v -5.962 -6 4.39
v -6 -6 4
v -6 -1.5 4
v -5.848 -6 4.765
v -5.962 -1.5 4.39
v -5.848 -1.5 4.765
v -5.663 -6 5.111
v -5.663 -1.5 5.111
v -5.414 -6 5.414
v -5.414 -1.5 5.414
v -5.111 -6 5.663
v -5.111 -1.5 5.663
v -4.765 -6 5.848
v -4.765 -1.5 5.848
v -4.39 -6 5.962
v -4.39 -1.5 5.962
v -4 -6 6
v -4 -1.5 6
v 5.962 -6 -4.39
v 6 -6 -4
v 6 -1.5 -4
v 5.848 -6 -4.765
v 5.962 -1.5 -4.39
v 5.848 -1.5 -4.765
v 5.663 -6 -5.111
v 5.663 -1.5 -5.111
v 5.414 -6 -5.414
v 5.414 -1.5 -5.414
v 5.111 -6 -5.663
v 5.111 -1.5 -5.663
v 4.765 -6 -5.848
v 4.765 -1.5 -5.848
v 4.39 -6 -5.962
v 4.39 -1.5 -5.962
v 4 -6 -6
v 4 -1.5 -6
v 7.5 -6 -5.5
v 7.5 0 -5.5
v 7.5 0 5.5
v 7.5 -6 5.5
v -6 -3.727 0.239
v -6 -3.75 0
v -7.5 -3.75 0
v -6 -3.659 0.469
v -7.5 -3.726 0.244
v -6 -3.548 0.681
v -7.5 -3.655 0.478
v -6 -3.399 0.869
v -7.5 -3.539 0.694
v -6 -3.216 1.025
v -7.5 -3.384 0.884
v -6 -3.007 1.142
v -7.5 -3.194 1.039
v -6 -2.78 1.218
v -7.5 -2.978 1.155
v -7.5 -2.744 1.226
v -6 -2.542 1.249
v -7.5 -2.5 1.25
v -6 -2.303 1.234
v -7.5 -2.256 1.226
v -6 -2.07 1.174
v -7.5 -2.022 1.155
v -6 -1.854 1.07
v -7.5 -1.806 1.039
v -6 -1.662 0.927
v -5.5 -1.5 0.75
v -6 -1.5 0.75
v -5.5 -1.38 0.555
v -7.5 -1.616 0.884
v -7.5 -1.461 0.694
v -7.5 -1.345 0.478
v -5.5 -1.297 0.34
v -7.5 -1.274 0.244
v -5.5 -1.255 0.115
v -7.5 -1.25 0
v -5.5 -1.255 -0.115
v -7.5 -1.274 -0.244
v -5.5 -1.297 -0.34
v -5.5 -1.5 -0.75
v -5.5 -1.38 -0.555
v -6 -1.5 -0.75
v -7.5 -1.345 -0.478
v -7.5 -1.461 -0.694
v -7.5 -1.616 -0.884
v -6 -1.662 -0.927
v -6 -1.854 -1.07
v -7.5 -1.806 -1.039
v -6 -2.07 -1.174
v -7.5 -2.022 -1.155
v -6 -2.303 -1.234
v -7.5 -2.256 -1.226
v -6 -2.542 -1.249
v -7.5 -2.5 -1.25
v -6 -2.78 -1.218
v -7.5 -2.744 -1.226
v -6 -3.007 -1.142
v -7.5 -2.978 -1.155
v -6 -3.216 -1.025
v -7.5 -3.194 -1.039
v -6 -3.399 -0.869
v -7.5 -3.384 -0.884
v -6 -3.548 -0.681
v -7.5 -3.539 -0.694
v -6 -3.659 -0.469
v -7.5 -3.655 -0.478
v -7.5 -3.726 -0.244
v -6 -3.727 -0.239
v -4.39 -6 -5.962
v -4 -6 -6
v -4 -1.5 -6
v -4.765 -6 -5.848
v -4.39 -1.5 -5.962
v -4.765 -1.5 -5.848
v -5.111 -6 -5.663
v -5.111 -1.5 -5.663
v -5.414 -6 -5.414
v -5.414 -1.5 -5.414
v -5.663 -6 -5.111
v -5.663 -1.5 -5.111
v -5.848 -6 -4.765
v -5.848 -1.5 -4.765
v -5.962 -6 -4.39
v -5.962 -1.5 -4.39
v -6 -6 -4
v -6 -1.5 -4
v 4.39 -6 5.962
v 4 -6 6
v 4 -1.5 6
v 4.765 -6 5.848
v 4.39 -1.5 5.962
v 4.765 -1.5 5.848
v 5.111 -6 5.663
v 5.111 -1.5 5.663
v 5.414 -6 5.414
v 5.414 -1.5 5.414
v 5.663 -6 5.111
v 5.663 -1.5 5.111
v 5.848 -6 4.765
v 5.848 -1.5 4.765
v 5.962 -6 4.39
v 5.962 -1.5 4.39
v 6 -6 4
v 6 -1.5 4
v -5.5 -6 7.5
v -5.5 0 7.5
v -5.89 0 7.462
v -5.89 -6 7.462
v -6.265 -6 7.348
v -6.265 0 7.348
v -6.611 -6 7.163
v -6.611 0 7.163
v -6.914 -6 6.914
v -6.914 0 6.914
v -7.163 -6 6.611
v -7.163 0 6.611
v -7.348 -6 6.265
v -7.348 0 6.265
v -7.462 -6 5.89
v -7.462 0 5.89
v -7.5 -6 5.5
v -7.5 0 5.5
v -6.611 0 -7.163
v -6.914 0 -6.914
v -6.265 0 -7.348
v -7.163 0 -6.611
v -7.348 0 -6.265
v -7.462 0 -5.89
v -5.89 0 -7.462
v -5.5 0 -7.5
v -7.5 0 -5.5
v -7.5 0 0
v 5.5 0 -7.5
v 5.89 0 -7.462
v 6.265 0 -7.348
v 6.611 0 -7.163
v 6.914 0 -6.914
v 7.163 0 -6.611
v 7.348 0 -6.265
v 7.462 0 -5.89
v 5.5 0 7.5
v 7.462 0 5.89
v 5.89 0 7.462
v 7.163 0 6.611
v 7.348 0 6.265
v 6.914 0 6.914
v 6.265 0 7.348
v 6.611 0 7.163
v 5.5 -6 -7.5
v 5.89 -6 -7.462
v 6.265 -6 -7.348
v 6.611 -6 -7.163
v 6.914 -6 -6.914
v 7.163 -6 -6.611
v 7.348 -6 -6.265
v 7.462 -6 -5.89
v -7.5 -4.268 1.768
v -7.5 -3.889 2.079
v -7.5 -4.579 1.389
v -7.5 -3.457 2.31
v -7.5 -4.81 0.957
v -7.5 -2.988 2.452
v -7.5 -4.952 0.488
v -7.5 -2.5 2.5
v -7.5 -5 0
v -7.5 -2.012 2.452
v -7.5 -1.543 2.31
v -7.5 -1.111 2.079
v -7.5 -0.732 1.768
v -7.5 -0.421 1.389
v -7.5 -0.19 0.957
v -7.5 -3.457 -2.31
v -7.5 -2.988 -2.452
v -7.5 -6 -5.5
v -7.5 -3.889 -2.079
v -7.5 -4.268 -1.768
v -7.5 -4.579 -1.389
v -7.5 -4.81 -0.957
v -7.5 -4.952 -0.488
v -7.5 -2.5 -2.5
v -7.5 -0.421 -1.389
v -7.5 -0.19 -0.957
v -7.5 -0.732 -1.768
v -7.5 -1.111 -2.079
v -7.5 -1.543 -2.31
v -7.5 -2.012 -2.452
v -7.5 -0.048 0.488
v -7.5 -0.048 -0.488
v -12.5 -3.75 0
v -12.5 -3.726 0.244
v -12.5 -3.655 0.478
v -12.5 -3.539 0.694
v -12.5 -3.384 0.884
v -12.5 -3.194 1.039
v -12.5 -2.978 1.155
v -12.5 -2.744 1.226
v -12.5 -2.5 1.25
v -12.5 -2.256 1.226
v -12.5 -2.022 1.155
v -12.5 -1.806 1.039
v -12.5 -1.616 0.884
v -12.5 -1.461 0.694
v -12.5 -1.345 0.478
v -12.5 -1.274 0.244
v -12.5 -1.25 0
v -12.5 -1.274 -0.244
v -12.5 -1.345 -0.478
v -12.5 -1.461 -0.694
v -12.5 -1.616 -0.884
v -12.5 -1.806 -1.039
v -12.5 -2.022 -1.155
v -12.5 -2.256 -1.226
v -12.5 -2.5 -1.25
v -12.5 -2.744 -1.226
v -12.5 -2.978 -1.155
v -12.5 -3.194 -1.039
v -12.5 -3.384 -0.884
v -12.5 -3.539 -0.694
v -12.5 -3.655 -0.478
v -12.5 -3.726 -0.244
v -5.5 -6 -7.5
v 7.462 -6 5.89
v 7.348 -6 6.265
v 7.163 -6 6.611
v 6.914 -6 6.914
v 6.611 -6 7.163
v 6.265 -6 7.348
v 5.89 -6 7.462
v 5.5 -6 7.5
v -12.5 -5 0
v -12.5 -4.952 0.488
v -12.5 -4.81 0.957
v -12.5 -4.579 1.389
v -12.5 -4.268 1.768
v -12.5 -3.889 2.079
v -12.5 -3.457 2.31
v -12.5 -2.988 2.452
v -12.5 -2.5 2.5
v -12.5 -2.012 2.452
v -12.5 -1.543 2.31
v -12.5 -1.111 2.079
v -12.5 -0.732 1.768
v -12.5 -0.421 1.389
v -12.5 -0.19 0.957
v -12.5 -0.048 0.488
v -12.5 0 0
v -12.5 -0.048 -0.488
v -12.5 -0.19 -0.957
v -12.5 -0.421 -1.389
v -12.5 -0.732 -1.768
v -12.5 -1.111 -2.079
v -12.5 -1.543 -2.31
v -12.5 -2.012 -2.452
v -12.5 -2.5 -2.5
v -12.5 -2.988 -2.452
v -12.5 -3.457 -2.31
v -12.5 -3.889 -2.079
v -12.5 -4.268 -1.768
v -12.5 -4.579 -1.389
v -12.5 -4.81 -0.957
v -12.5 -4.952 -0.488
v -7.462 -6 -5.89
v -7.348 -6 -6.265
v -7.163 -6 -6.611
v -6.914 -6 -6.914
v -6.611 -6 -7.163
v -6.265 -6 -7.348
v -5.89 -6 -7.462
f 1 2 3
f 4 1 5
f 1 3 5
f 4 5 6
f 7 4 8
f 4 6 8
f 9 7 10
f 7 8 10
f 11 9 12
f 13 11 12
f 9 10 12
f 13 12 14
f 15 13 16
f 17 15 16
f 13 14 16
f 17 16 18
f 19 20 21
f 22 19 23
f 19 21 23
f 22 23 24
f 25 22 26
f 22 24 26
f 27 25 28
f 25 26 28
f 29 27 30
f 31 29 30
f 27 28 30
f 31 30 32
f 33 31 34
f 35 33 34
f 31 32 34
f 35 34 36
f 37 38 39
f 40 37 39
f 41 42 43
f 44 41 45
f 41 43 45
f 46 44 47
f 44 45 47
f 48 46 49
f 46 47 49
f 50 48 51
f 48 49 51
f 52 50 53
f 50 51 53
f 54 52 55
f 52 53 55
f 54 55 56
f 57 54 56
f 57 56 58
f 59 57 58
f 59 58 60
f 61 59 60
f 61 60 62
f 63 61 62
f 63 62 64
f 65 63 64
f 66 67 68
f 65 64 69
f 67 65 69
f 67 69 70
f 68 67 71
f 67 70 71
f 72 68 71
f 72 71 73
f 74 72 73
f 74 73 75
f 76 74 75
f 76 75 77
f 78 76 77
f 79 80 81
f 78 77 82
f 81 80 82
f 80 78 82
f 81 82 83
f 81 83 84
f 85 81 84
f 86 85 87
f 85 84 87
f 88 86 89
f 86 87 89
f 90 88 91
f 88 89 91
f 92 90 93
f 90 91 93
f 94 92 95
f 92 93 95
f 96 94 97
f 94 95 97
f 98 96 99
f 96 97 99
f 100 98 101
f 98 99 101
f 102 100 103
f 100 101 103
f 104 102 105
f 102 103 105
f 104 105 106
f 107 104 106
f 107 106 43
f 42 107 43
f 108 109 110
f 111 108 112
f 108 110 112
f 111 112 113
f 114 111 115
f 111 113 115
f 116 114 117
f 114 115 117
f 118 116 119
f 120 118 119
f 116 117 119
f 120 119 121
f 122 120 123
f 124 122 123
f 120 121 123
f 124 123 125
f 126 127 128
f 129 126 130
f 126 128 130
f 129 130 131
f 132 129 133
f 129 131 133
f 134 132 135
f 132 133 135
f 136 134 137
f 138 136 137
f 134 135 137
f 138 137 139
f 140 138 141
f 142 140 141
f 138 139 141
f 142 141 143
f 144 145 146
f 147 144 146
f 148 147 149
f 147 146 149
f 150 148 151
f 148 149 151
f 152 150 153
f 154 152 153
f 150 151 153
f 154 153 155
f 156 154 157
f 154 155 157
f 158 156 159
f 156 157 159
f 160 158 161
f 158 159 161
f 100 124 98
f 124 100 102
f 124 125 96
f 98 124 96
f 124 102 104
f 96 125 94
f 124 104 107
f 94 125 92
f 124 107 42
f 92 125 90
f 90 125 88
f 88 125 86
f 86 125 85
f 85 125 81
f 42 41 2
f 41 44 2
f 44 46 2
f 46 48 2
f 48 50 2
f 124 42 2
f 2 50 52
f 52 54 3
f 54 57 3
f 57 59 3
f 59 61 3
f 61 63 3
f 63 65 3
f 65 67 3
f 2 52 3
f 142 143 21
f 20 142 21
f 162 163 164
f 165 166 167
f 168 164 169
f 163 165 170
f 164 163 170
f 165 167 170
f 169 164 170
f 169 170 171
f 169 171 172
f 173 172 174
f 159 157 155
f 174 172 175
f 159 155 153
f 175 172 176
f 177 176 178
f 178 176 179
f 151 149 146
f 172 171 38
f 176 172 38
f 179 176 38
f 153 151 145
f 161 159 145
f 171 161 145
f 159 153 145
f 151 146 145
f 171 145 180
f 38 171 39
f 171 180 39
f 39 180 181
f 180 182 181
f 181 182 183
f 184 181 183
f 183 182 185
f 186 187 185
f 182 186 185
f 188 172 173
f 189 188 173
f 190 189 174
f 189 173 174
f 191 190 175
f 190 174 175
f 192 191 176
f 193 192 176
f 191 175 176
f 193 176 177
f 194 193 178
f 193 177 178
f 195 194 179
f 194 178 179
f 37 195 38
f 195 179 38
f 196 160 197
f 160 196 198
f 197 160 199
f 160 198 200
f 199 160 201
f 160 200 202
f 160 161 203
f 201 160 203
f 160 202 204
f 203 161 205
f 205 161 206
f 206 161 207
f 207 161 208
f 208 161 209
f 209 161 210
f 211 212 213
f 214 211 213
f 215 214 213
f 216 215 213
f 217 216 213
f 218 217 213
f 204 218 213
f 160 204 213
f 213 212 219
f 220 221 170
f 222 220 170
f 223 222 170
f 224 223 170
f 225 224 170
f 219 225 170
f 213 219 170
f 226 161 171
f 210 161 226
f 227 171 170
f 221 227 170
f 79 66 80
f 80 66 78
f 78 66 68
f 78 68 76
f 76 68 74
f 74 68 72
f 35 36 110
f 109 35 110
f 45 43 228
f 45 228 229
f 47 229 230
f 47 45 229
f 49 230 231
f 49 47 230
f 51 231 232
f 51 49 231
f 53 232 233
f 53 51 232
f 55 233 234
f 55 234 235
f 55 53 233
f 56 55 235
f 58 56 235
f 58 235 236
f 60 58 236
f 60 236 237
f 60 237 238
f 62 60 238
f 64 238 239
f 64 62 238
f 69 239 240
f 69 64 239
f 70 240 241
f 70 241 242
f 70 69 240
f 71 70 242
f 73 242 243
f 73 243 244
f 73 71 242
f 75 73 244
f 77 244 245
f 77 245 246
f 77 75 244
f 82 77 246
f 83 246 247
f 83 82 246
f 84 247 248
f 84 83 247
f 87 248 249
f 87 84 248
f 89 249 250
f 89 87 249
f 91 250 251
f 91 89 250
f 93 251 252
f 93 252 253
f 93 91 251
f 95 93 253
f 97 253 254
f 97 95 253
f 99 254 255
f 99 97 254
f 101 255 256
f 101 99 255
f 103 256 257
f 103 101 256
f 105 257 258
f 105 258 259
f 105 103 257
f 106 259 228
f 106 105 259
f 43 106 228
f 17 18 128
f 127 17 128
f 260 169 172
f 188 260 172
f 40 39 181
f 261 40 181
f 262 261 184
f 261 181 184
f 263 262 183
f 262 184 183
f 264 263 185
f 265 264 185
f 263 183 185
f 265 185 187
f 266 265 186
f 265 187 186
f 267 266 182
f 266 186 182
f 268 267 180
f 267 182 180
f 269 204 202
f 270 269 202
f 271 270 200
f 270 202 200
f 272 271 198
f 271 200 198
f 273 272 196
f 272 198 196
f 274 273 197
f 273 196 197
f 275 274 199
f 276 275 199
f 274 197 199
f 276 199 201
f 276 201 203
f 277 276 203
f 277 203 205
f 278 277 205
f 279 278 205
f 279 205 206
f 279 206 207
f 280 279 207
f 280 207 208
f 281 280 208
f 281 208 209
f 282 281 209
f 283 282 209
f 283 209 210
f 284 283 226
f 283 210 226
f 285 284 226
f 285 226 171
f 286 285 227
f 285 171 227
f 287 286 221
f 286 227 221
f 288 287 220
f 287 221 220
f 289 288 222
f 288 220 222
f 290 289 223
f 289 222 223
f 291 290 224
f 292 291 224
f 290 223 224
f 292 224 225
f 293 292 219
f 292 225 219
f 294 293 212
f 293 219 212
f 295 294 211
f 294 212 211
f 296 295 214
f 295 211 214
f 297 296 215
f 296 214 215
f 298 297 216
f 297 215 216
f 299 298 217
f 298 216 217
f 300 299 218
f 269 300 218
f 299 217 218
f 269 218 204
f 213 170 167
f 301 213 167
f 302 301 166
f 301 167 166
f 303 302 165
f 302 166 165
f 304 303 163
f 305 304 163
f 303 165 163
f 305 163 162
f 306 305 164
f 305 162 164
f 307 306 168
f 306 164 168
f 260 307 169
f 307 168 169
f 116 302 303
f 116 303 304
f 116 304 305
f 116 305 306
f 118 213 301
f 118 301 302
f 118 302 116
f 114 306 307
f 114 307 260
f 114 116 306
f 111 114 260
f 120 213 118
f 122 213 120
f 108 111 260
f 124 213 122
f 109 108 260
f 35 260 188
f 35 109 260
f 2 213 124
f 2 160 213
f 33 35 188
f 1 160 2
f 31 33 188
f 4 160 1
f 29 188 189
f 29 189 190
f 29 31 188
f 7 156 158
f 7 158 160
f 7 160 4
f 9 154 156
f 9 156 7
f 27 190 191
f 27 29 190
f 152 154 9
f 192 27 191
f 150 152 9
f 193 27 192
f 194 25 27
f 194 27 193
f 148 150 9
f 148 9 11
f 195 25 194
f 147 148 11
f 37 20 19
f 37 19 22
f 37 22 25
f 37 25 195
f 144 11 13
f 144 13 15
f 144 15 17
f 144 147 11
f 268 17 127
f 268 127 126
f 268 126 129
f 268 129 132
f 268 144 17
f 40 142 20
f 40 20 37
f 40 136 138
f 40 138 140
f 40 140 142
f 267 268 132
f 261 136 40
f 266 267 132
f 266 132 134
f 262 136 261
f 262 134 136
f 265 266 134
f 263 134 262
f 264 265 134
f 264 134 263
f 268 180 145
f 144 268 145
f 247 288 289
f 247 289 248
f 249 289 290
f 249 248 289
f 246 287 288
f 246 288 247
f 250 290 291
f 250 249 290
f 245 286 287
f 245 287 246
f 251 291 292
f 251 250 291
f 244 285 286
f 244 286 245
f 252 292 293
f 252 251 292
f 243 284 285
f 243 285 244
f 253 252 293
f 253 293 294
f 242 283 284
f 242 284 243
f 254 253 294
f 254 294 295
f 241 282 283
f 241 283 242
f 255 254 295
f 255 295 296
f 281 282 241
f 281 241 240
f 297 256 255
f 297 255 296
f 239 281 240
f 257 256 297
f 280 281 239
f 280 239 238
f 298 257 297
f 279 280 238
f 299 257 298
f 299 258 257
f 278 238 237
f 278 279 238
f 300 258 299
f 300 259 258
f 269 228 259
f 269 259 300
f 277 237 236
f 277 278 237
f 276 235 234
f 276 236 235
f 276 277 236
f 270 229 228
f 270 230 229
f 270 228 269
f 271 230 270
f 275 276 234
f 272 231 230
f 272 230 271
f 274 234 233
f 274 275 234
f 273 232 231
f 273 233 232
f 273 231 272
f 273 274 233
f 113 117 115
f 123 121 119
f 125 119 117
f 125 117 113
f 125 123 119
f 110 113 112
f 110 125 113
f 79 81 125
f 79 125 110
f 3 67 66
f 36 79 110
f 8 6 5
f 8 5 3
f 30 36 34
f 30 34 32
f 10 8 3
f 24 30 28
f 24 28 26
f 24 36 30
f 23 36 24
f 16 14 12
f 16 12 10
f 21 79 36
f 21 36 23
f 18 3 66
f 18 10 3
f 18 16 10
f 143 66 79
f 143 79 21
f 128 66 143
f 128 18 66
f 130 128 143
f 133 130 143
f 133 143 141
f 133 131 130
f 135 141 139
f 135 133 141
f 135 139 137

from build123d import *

# Parameters (mm, degrees)
F1_DEPTH = 1.5
F2_DEPTH = 6
F3_R     = 1.25
F4_DEPTH = 2
F5_DEPTH = 5


with BuildPart() as f1:
    # F0 (on Front) → F1 (new body)
    with BuildSketch(Plane.XZ):
        with BuildLine():
            Line((-4, -6), (4, -6))
            ThreePointArc((4, -6), (5.414214, -5.414214), (6, -4))
            Line((6, -4), (6, 4))
            ThreePointArc((6, 4), (5.414214, 5.414214), (4, 6))
            Line((4, 6), (-4, 6))
            ThreePointArc((-4, 6), (-5.414214, 5.414214), (-6, 4))
            Line((-6, 4), (-6, -4))
            ThreePointArc((-6, -4), (-5.414214, -5.414214), (-4, -6))
        make_face()
    extrude(amount=F1_DEPTH)

    # F0 (on Front) → F2 (join)
    with BuildSketch(Plane.XZ):
        with BuildLine():
            Line((-5.5, -7.5), (5.5, -7.5))
            ThreePointArc((5.5, -7.5), (6.914214, -6.914214), (7.5, -5.5))
            Line((7.5, -5.5), (7.5, 5.5))
            ThreePointArc((7.5, 5.5), (6.914214, 6.914214), (5.5, 7.5))
            Line((5.5, 7.5), (-5.5, 7.5))
            ThreePointArc((-5.5, 7.5), (-6.914214, 6.914214), (-7.5, 5.5))
            Line((-7.5, 5.5), (-7.5, -5.5))
            ThreePointArc((-7.5, -5.5), (-6.914214, -6.914214), (-5.5, -7.5))
        make_face()
        with BuildLine():
            ThreePointArc((6, -4), (5.414214, -5.414214), (4, -6))
            Line((4, -6), (-4, -6))
            ThreePointArc((-4, -6), (-5.414214, -5.414214), (-6, -4))
            Line((-6, -4), (-6, 4))
            ThreePointArc((-6, 4), (-5.414214, 5.414214), (-4, 6))
            Line((-4, 6), (4, 6))
            ThreePointArc((4, 6), (5.414214, 5.414214), (6, 4))
            Line((6, 4), (6, -4))
        make_face(mode=Mode.SUBTRACT)
    extrude(amount=F2_DEPTH)

    # F3 (on face) → F4 (cut)
    with BuildSketch(Plane(origin=(-7.5, 0, 0), x_dir=(0, -1, 0), z_dir=(-1, 0, 0))):
        with Locations((2.5, 0)):
            Circle(F3_R)
    extrude(amount=-F4_DEPTH, mode=Mode.SUBTRACT)

    # F3 (on face) → F5 (join)
    with BuildSketch(Plane(origin=(-7.5, 0, 0), x_dir=(0, -1, 0), z_dir=(-1, 0, 0))):
        with BuildLine():
            ThreePointArc((0, 0), (2.5, -2.5), (5, 0))
            ThreePointArc((5, 0), (2.5, 2.5), (0, 0))
        make_face()
        with Locations((2.5, 0)):
            Circle(F3_R, mode=Mode.SUBTRACT)
    extrude(amount=F5_DEPTH)


solid = f1.part
